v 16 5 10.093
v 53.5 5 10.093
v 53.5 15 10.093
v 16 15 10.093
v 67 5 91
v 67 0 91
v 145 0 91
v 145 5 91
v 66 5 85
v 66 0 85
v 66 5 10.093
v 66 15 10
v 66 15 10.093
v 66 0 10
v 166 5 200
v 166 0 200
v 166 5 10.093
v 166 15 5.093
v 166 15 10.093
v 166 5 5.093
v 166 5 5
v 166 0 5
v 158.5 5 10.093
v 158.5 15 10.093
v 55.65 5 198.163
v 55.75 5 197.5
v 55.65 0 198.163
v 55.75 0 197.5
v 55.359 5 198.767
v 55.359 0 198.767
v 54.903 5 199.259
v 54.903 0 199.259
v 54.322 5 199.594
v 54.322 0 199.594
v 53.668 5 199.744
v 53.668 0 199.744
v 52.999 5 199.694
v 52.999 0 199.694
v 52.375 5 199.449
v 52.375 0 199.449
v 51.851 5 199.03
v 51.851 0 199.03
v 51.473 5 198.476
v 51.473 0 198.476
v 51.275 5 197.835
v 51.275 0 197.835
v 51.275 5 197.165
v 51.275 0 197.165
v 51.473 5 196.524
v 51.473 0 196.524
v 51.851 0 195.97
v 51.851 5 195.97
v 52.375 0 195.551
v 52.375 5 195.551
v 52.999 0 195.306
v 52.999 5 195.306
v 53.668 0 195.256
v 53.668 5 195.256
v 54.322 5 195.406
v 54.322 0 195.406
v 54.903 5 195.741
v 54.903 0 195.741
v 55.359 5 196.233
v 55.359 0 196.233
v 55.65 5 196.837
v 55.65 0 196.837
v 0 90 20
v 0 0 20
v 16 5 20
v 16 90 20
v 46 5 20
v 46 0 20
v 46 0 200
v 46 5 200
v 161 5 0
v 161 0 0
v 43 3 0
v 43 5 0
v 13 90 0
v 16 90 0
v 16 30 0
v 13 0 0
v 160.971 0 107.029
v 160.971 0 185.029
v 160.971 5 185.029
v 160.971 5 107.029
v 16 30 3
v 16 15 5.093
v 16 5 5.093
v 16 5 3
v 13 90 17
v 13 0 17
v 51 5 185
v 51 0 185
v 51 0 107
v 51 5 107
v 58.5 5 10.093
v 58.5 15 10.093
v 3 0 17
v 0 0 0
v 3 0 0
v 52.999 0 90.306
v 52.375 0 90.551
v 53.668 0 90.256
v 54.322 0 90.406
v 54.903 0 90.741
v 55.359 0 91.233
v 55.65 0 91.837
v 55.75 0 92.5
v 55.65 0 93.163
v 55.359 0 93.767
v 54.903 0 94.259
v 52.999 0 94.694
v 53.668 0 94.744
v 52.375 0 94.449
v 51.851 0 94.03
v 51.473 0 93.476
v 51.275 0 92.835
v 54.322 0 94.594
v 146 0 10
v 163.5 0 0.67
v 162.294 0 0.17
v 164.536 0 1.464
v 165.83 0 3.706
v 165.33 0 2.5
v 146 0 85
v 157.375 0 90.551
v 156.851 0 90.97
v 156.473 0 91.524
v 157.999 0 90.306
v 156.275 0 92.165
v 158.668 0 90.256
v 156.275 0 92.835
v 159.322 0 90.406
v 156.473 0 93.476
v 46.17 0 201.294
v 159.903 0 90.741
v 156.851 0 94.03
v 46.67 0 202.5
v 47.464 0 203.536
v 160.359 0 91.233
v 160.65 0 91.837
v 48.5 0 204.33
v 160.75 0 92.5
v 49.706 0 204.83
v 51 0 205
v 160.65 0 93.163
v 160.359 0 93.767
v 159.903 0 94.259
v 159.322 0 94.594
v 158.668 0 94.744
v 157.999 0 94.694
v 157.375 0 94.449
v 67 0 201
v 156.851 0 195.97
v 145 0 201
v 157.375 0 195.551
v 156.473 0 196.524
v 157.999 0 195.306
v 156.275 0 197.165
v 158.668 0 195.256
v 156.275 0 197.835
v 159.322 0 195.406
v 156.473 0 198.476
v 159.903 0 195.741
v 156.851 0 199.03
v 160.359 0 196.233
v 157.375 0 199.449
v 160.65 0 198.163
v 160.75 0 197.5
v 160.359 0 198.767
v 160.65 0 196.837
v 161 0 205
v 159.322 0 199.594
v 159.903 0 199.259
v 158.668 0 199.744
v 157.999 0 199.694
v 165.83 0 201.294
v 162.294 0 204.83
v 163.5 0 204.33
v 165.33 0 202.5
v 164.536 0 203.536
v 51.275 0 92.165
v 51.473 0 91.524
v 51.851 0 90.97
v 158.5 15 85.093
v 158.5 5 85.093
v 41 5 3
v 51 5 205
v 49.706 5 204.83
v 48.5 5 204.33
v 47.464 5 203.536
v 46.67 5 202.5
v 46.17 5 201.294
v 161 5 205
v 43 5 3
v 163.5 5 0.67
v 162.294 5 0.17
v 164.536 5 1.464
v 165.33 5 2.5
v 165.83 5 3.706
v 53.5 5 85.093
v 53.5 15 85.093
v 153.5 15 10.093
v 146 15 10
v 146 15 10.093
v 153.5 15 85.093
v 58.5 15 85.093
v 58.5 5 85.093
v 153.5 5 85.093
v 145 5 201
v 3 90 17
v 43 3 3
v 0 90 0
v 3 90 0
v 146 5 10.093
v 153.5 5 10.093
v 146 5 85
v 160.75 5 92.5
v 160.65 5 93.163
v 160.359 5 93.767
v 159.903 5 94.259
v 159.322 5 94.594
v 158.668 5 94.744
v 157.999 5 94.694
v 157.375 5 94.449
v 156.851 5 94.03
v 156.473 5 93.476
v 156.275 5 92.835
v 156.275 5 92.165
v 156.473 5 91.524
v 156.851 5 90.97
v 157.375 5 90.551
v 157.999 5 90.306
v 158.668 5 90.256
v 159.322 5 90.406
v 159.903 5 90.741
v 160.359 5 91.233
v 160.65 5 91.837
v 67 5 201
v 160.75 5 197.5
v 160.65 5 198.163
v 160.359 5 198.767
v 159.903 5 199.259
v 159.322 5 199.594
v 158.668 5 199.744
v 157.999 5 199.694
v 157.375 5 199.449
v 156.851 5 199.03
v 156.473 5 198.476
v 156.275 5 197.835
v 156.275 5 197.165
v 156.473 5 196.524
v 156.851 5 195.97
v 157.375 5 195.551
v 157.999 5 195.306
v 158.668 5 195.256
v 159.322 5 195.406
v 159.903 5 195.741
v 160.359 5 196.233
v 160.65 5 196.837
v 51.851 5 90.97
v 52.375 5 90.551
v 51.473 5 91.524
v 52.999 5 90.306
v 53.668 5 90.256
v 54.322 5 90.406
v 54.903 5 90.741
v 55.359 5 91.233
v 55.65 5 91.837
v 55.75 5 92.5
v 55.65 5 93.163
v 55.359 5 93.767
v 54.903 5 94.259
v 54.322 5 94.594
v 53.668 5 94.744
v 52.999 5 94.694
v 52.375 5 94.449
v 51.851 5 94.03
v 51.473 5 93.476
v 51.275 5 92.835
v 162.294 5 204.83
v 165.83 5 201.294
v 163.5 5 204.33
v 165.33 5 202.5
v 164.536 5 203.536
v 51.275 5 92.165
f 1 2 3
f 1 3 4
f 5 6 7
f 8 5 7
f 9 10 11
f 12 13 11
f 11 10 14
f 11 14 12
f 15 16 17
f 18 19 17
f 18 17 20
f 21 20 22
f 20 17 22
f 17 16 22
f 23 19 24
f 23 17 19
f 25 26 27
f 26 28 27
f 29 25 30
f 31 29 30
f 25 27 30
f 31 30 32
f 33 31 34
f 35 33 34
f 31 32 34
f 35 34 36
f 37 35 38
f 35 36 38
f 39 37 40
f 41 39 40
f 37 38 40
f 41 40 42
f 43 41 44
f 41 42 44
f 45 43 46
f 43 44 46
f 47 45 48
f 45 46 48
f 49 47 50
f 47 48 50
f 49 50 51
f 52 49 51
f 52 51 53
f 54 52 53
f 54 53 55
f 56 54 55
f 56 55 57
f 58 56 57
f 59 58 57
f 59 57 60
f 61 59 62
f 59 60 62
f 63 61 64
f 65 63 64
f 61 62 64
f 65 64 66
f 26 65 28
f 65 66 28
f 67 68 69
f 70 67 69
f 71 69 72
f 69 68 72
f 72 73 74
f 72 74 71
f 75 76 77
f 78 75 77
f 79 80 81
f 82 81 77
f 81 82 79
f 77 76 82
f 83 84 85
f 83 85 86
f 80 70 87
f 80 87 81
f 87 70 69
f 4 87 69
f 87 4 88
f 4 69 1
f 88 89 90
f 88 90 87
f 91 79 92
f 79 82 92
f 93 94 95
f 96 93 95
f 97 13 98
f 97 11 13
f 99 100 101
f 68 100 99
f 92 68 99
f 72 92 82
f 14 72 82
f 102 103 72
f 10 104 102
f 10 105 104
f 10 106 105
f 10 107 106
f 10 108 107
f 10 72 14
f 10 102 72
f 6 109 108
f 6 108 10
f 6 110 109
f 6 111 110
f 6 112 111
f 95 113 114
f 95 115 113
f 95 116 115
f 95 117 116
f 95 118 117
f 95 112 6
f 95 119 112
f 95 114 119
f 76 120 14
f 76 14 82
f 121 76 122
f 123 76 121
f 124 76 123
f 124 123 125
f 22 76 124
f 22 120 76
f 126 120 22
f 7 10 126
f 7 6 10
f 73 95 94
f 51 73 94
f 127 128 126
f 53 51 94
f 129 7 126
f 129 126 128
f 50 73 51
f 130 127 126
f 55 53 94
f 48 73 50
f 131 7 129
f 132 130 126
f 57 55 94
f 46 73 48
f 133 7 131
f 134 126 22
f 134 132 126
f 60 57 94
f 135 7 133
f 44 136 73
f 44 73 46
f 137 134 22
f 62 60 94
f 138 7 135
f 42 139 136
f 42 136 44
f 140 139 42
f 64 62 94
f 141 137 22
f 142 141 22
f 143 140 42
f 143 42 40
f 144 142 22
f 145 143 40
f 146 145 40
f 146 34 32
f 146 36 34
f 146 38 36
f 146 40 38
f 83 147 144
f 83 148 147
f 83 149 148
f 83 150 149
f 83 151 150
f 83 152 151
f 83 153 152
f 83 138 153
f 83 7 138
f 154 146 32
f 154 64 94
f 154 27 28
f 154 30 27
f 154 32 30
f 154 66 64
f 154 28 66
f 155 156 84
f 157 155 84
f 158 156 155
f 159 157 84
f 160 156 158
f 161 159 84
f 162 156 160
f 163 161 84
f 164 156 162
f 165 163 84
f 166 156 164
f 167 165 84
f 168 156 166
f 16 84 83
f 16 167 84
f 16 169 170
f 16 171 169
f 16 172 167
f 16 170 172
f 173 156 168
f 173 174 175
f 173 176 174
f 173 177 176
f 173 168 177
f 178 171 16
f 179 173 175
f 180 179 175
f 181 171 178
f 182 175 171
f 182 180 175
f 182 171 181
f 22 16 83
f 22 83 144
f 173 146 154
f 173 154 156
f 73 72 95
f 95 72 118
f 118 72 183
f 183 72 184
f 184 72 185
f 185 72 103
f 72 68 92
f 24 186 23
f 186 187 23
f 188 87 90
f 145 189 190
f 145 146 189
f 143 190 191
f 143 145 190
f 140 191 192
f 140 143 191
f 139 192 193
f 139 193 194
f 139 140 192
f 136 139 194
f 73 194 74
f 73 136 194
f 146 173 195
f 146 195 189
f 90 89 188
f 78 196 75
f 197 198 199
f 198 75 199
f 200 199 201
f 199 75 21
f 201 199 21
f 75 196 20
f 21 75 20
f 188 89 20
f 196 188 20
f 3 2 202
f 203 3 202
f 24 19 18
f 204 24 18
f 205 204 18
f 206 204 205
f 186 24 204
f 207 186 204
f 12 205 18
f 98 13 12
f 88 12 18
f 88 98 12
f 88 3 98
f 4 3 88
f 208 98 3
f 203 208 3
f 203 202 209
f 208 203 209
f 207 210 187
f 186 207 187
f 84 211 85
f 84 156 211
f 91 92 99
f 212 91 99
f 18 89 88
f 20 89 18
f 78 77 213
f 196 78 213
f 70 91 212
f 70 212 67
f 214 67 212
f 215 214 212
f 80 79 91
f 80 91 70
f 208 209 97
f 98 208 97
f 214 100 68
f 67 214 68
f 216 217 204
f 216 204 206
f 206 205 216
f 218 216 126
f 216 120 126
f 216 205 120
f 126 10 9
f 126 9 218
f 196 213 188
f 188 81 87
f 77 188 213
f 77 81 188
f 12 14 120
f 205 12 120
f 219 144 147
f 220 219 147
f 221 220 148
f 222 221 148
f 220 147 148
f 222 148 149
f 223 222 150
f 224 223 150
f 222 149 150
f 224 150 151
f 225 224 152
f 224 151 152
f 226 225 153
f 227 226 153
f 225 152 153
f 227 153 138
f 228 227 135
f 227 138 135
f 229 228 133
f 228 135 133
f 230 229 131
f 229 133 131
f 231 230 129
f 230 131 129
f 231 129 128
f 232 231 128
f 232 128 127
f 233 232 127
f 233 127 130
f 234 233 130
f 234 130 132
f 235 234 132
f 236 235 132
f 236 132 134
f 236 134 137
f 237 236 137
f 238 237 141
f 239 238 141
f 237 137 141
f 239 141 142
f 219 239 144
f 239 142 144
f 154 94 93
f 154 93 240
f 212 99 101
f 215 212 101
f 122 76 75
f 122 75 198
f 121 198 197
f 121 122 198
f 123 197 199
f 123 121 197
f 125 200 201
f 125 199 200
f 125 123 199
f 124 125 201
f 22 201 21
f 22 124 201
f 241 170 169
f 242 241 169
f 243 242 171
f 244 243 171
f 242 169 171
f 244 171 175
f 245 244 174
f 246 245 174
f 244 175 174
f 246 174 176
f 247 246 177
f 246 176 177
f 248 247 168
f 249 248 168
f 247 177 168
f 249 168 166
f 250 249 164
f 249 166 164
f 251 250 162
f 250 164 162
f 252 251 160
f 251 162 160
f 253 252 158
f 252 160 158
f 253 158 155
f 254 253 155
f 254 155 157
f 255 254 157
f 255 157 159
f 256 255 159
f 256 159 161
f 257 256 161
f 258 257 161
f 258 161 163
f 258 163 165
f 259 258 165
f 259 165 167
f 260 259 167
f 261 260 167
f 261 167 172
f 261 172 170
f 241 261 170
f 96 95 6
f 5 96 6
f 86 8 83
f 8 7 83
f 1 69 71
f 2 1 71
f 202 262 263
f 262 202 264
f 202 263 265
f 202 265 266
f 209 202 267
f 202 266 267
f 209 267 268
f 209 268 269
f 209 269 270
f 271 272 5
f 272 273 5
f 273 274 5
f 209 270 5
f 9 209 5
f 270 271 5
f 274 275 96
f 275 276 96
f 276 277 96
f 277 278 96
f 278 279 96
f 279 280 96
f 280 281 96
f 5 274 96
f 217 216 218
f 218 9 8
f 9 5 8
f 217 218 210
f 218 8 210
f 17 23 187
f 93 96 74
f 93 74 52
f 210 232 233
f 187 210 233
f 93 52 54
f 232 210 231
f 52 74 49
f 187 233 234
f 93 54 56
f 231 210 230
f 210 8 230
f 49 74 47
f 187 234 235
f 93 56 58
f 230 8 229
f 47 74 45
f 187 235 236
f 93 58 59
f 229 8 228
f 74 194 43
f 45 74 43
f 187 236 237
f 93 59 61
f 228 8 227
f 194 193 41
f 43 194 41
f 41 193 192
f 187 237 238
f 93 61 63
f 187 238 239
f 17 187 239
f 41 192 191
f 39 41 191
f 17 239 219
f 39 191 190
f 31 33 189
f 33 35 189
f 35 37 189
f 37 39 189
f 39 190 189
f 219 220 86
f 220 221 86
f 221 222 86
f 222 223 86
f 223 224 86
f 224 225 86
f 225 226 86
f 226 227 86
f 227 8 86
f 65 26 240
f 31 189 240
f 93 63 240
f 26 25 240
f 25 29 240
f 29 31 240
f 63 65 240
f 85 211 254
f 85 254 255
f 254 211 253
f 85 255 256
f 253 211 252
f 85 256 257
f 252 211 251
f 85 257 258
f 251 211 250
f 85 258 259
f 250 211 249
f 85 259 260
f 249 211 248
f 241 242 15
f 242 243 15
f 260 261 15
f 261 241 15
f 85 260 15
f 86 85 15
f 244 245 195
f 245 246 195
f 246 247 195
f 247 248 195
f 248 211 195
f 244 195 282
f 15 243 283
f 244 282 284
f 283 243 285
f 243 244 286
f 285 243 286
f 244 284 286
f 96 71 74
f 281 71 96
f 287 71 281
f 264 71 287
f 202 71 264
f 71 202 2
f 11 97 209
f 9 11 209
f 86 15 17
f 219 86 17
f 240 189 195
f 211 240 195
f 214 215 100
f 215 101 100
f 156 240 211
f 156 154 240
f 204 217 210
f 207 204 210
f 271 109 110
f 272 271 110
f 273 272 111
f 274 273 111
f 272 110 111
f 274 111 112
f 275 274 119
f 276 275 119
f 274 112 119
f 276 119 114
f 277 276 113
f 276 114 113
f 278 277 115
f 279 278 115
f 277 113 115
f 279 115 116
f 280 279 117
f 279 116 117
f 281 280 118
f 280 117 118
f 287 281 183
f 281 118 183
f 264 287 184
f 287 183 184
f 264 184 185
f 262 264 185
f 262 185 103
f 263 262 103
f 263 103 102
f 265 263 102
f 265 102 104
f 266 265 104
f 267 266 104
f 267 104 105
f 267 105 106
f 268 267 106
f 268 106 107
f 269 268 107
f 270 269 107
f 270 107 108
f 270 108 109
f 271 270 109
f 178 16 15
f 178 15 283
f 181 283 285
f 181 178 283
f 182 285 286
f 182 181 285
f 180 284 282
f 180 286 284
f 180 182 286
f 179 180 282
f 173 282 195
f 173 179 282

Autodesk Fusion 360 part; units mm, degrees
sketch "Sketch1" plane through (0, 0, 0) normal (0, 1, 0) x (1, 0, 0)
  line L0 (0, 0) -> (0, -20)
  line L1 (0, -20) -> (16, -20)
  line L2 (16, -20) -> (16, 0)
  line L3 (16, 0) -> (13, 0)
  line L4 (13, 0) -> (13, -17)
  line L5 (13, -17) -> (3, -17)
  line L6 (3, -17) -> (3, 0)
  line L7 (3, 0) -> (0, 0)
extrude "Extrude1" add sketch "Sketch1" along normal blind 60
sketch "Sketch2" plane through (0, 0, 0) normal (0, -1, 0) x (1, 0, 0)
  line L0 (0, 0) -> (3, 0)
  line L1 (3, 0) -> (3, 17)
  line L2 (3, 17) -> (13, 17)
  line L3 (13, 17) -> (13, 0)
  line L4 (13, 0) -> (16, 0)
  line L5 (16, 0) -> (16, 20)
  line L6 (16, 20) -> (0, 20)
  line L7 (0, 20) -> (0, 0)
  line L8 (16, 0) -> (66, 0)
  line L9 (66, 0) -> (66, 85)
  line L10 (66, 85) -> (146, 85)
  line L11 (146, 85) -> (146, 0)
  line L12 (146, 0) -> (166, 0)
  line L13 (166, 0) -> (166, 205)
  line L14 (166, 205) -> (46, 205)
  line L15 (46, 205) -> (46, 20)
  line L16 (46, 20) -> (16, 20)
  dimension "d3" = 50
  dimension "d4" = 85
  dimension "d5" = 80
  dimension "d6" = 20
  dimension "d7" = 205
  dimension "d8" = 120
  dimension "d9" = 185
extrude "Extrude2" add sketch "Sketch2" against normal blind 3 contours L5 L8 L9 L10 L11 L12 L13 L14 L15 L16
sketch "Sketch3" plane through (0, 0, 0) normal (0, 1, 0) x (1, 0, 0)
  line L0 (65, 0) -> (150, 0)
  line L1 (150, 0) -> (150, -10)
  line L2 (150, -10) -> (65, -10)
  line L3 (65, -10) -> (65, 0)
extrude "Extrude3" add sketch "Sketch3" along normal blind 3
sketch "Sketch4" plane through (0, 0, 0) normal (0, 1, 0) x (1, 0, 0)
sketch "Sketch5" plane through (0, 0, 0) normal (0, 0, 1) x (1, 0, 0)
  line L0 (16, 3) -> (16, 30)
  line L1 (16, 30) -> (43, 3)
  line L2 (43, 3) -> (16, 3)
extrude "Extrude4" add sketch "Sketch5" along normal blind 3
sketch "Sketch6" plane through (0, 0, 0) normal (0, -1, 0) x (1, 0, 0)
  line L0 (66, 10) -> (66, 85)
  line L1 (66, 85) -> (146, 85)
  line L2 (146, 85) -> (146, 10)
  line L3 (146, 10) -> (66, 10)
  line L4 (13, 0) -> (166, 0)
  line L5 (166, 0) -> (166, 205)
  line L6 (166, 205) -> (46, 205)
  line L7 (46, 205) -> (46, 20)
  line L8 (46, 20) -> (16, 20)
  line L9 (16, 20) -> (0, 20)
  line L10 (0, 20) -> (0, 0)
  line L11 (0, 0) -> (3, 0)
  line L12 (3, 0) -> (3, 17)
  line L13 (3, 17) -> (13, 17)
  line L14 (13, 17) -> (13, 0)
  circle A0 centre (51.25, 199.75) radius 2.25
  circle A1 centre (160.75, 199.75) radius 2.25
  circle A2 centre (51.25, 90.25) radius 2.25
  circle A3 centre (160.75, 90.25) radius 2.25
  dimension "d16" = 4.5
  dimension "d17" = 5.25
  dimension "d18" = 5.25
  dimension "d19" = 4.5
  dimension "d20" = 5.25
  dimension "d21" = 5.25
  dimension "d22" = 4.5
  dimension "d23" = 5.25
  dimension "d24" = 114.75
  dimension "d25" = 4.5
  dimension "d26" = 5.25
  dimension "d27" = 114.75
extrude "Extrude5" cut sketch "Sketch6" against normal blind 5 contours A0 | A1 | A2 | A3
sketch "Sketch7" plane through (0, 0, 0) normal (0, -1, 0) x (1, 0, 0)
  circle A0 centre (160.75, 90.25) radius 2.25
  circle A1 centre (160.75, 199.75) radius 2.25
  circle A2 centre (51.25, 90.25) radius 2.25
  circle A3 centre (51.25, 199.75) radius 2.25
  line L0 (66, 10) -> (66, 85)
  line L1 (66, 85) -> (146, 85)
  line L2 (146, 85) -> (146, 10)
  line L3 (146, 10) -> (66, 10)
  line L4 (13, 0) -> (166, 0)
  line L5 (166, 0) -> (166, 205)
  line L6 (166, 205) -> (46, 205)
  line L7 (46, 205) -> (46, 20)
  line L8 (46, 20) -> (16, 20)
  line L9 (16, 20) -> (0, 20)
  line L10 (0, 20) -> (0, 0)
  line L11 (0, 0) -> (3, 0)
  line L12 (3, 0) -> (3, 17)
  line L13 (3, 17) -> (13, 17)
  line L14 (13, 17) -> (13, 0)
  line L15 (51, 185) -> (67, 201)
  line L16 (67, 201) -> (145, 201)
  line L17 (145, 201) -> (160.9711, 185.0289)
  line L18 (160.9711, 185.0289) -> (160.9711, 107.0289)
  line L19 (51, 185) -> (51, 107)
  line L20 (51, 107) -> (66.9997, 91.0003)
  line L21 (66.9997, 91.0003) -> (144.9997, 91.0003)
  line L22 (144.9997, 91.0003) -> (160.9711, 107.0289)
  dimension "d30" = 78
  dimension "d31" = 22.627
  dimension "d32" = 78
  dimension "d33" = 78
extrude "Extrude6" cut sketch "Sketch7" against normal blind 10 contours L15 L16 L17 L18 L19 L20 L21 L22
sketch "Sketch8" plane through (0, 0, 0) normal (0, -1, 0) x (1, 0, 0)
  line L0 (66.9997, 91.0003) -> (51, 107)
  line L1 (51, 107) -> (51, 185)
  line L2 (51, 185) -> (67, 201)
  line L3 (67, 201) -> (145, 201)
  line L4 (145, 201) -> (160.9711, 185.0289)
  line L5 (160.9711, 185.0289) -> (160.9711, 107.0289)
  line L6 (160.9711, 107.0289) -> (144.9997, 91.0003)
  line L7 (144.9997, 91.0003) -> (66.9997, 91.0003)
  circle A0 centre (160.75, 90.25) radius 2.25
  circle A1 centre (160.75, 199.75) radius 2.25
  circle A2 centre (51.25, 90.25) radius 2.25
  line L8 (66, 10) -> (66, 85)
  line L9 (66, 85) -> (146, 85)
  line L10 (146, 85) -> (146, 10)
  line L11 (146, 10) -> (66, 10)
  line L12 (13, 0) -> (166, 0)
  line L13 (166, 0) -> (166, 205)
  line L14 (166, 205) -> (46, 205)
  line L15 (46, 205) -> (46, 20)
  line L16 (46, 20) -> (16, 20)
  line L17 (16, 20) -> (0, 20)
  line L18 (0, 20) -> (0, 0)
  line L19 (0, 0) -> (3, 0)
  line L20 (3, 0) -> (3, 17)
  line L21 (3, 17) -> (13, 17)
  line L22 (13, 17) -> (13, 0)
sketch "Sketch9" plane through (0, 0, 0) normal (0, -1, 0) x (1, 0, 0)
  circle A0 centre (51, 200) radius 3.6056
extrude "Extrude7" add sketch "Sketch9" against normal blind 3
sketch "Sketch10" plane through (0, 0, 0) normal (0, -1, 0) x (1, 0, 0)
  circle A0 centre (53.5, 197.5) radius 2.25
  line L0 (46, 205) -> (46, 20)
  line L1 (166, 205) -> (46, 205)
  dimension "d38" = 4.5
  dimension "d39" = 7.5
  dimension "d40" = 7.5
sketch "Sketch11" plane through (0, 0, 0) normal (0, -1, 0) x (1, 0, 0)
  circle A0 centre (160, 200) radius 4.464
extrude "Extrude8" add sketch "Sketch11" against normal blind 3
sketch "Sketch12" plane through (0, 0, 0) normal (0, -1, 0) x (1, 0, 0)
  circle A0 centre (158.5, 197.5) radius 2.25
  line L0 (166, 0) -> (166, 205)
  line L1 (166, 205) -> (46, 205)
  dimension "d43" = 4.5
  dimension "d44" = 7.5
  dimension "d45" = 7.5
extrude "Extrude9" cut sketch "Sketch10" against normal blind 3
extrude "Extrude10" cut sketch "Sketch12" against normal blind 3
sketch "Sketch13" plane through (0, 0, 0) normal (0, -1, 0) x (1, 0, 0)
  circle A0 centre (50, 90) radius 3.5652
  circle A1 centre (160, 90) radius 4.4009
extrude "Extrude11" add sketch "Sketch13" against normal blind 3 contours A0
extrude "Extrude12" add sketch "Sketch8" against normal blind 3 contours A0
sketch "Sketch14" plane through (0, 0, 0) normal (0, -1, 0) x (1, 0, 0)
  circle A0 centre (158.5, 197.5) radius 2.25
  circle A1 centre (53.5, 197.5) radius 2.25
  line L0 (66.9997, 91.0003) -> (51, 107)
  line L1 (51, 107) -> (51, 185)
  line L2 (51, 185) -> (67, 201)
  line L3 (67, 201) -> (145, 201)
  line L4 (145, 201) -> (160.9711, 185.0289)
  line L5 (160.9711, 185.0289) -> (160.9711, 107.0289)
  line L6 (160.9711, 107.0289) -> (144.9997, 91.0003)
  line L7 (144.9997, 91.0003) -> (66.9997, 91.0003)
  line L8 (66, 10) -> (66, 85)
  line L9 (66, 85) -> (146, 85)
  line L10 (146, 85) -> (146, 10)
  line L11 (146, 10) -> (66, 10)
  line L12 (13, 0) -> (166, 0)
  line L13 (166, 0) -> (166, 205)
  line L14 (166, 205) -> (46, 205)
  line L15 (46, 205) -> (46, 20)
  line L16 (46, 20) -> (16, 20)
  line L17 (16, 20) -> (0, 20)
  line L18 (0, 20) -> (0, 0)
  line L19 (0, 0) -> (3, 0)
  line L20 (3, 0) -> (3, 17)
  line L21 (3, 17) -> (13, 17)
  line L22 (13, 17) -> (13, 0)
  circle A2 centre (53.5, 92.5) radius 2.25
  circle A3 centre (158.5, 92.5) radius 2.25
  dimension "d54" = 4.5
  dimension "d55" = 7.5
  dimension "d57" = 7.5
  dimension "d58" = 4.5
  dimension "d59" = 7.5
  dimension "d60" = 7.5
extrude "Extrude13" cut sketch "Sketch14" against normal blind 3 contours A2 | A3
fillet "Fillet1" radius 5 1 edges at (46, 1.5, 205)
fillet "Fillet2" radius 5 1 edges at (166, 1.5, 205)
fillet "Fillet3" radius 5 1 edges at (166, 1.5, 0)
extrude "Extrude14" add 1 faces at (59.3333, 3, 38.3333) along direction (0, 1, 0) blind 2
sketch "Sketch15" plane through (0, 5, 0) normal (0, 1, 0) x (-1, 0, 0)
  arc A0 (-166, 5) -> (-161, 0) centre (-161, 5) ccw
  line L0 (-161, 0) -> (-43, 0)
  line L1 (-43, 0) -> (-43, 3)
  line L2 (-43, 3) -> (-41, 3)
  line L3 (-41, 3) -> (-16, 3)
  line L4 (-16, 3) -> (-16, 20)
  line L5 (-16, 20) -> (-46, 20)
  line L6 (-46, 20) -> (-46, 200)
  arc A1 (-46, 200) -> (-51, 205) centre (-51, 200) ccw
  line L7 (-51, 205) -> (-161, 205)
  arc A2 (-161, 205) -> (-166, 200) centre (-161, 200) ccw
  line L8 (-166, 200) -> (-166, 5)
  circle A3 centre (-53.5, 92.5) radius 2.25
  circle A4 centre (-158.5, 92.5) radius 2.25
  circle A5 centre (-158.5, 197.5) radius 2.25
  circle A6 centre (-53.5, 197.5) radius 2.25
  line L9 (-51, 107) -> (-66.9997, 91.0003)
  line L10 (-66.9997, 91.0003) -> (-144.9997, 91.0003)
  line L11 (-144.9997, 91.0003) -> (-160.9711, 107.0289)
  line L12 (-160.9711, 107.0289) -> (-160.9711, 185.0289)
  line L13 (-160.9711, 185.0289) -> (-145, 201)
  line L14 (-145, 201) -> (-67, 201)
  line L15 (-67, 201) -> (-51, 185)
  line L16 (-51, 185) -> (-51, 107)
  line L17 (-66, 10) -> (-146, 10)
  line L18 (-146, 10) -> (-146, 85)
  line L19 (-146, 85) -> (-66, 85)
  line L20 (-66, 85) -> (-66, 10)
  line L21 (-166, 10.0934) -> (-16, 10.0934)
  line L22 (-16, 10.0934) -> (-16, 5.0934)
  line L23 (-16, 5.0934) -> (-166, 5.0934)
  line L24 (-166, 5.0934) -> (-166, 10.0934)
  dimension "d71" = 5
extrude "Extrude15" add sketch "Sketch15" along normal blind 10 contours L4 L8 L17 L18 L20 L21 L22 L23 L24
sketch "Sketch16" plane through (0, 5, 0) normal (0, 1, 0) x (-1, 0, 0)
  line L0 (-166, 10.0934) -> (-146, 10.0934)
  line L1 (-146, 10.0934) -> (-146, 85)
  line L2 (-146, 85) -> (-66, 85)
  line L3 (-66, 85) -> (-66, 10.0934)
  line L4 (-66, 10.0934) -> (-16, 10.0934)
  line L5 (-16, 10.0934) -> (-16, 20)
  line L6 (-16, 20) -> (-46, 20)
  line L7 (-46, 20) -> (-46, 200)
  arc A0 (-46, 200) -> (-51, 205) centre (-51, 200) ccw
  line L8 (-51, 205) -> (-161, 205)
  arc A1 (-161, 205) -> (-166, 200) centre (-161, 200) ccw
  line L9 (-166, 200) -> (-166, 10.0934)
  line L10 (-51, 107) -> (-66.9997, 91.0003)
  line L11 (-66.9997, 91.0003) -> (-144.9997, 91.0003)
  line L12 (-144.9997, 91.0003) -> (-160.9711, 107.0289)
  line L13 (-160.9711, 107.0289) -> (-160.9711, 185.0289)
  line L14 (-160.9711, 185.0289) -> (-145, 201)
  line L15 (-145, 201) -> (-67, 201)
  line L16 (-67, 201) -> (-51, 185)
  line L17 (-51, 185) -> (-51, 107)
  circle A2 centre (-53.5, 197.5) radius 2.25
  circle A3 centre (-158.5, 197.5) radius 2.25
  circle A4 centre (-158.5, 92.5) radius 2.25
  circle A5 centre (-53.5, 92.5) radius 2.25
  line L18 (-158.5, 10.0934) -> (-153.5, 10.0934)
  line L19 (-153.5, 10.0934) -> (-153.5, 85.0934)
  line L20 (-153.5, 85.0934) -> (-158.5, 85.0934)
  line L21 (-158.5, 85.0934) -> (-158.5, 10.0934)
  dimension "d74" = 75
  dimension "d75" = 7.5
  dimension "d76" = 5
extrude "Extrude16" add sketch "Sketch16" along normal blind 10 contours L0 L18 L19 L20 L21
sketch "Sketch17" plane through (0, 5, 0) normal (0, 1, 0) x (-1, 0, 0)
  circle A0 centre (-53.5, 92.5) radius 2.25
  circle A1 centre (-158.5, 92.5) radius 2.25
  circle A2 centre (-158.5, 197.5) radius 2.25
  circle A3 centre (-53.5, 197.5) radius 2.25
  line L0 (-51, 107) -> (-66.9997, 91.0003)
  line L1 (-66.9997, 91.0003) -> (-144.9997, 91.0003)
  line L2 (-144.9997, 91.0003) -> (-160.9711, 107.0289)
  line L3 (-160.9711, 107.0289) -> (-160.9711, 185.0289)
  line L4 (-160.9711, 185.0289) -> (-145, 201)
  line L5 (-145, 201) -> (-67, 201)
  line L6 (-67, 201) -> (-51, 185)
  line L7 (-51, 185) -> (-51, 107)
  line L8 (-158.5, 10.0934) -> (-158.5, 85.0934)
  line L9 (-158.5, 85.0934) -> (-153.5, 85.0934)
  line L10 (-153.5, 85.0934) -> (-153.5, 10.0934)
  line L11 (-153.5, 10.0934) -> (-146, 10.0934)
  line L12 (-146, 10.0934) -> (-146, 85)
  line L13 (-146, 85) -> (-66, 85)
  line L14 (-66, 85) -> (-66, 10.0934)
  line L15 (-66, 10.0934) -> (-16, 10.0934)
  line L16 (-16, 10.0934) -> (-16, 20)
  line L17 (-16, 20) -> (-46, 20)
  line L18 (-46, 20) -> (-46, 200)
  arc A4 (-46, 200) -> (-51, 205) centre (-51, 200) ccw
  line L19 (-51, 205) -> (-161, 205)
  arc A5 (-161, 205) -> (-166, 200) centre (-161, 200) ccw
  line L20 (-166, 200) -> (-166, 10.0934)
  line L21 (-166, 10.0934) -> (-158.5, 10.0934)
  line L22 (-58.5, 10.0934) -> (-53.5, 10.0934)
  line L23 (-53.5, 10.0934) -> (-53.5, 85.0934)
  line L24 (-53.5, 85.0934) -> (-58.5, 85.0934)
  line L25 (-58.5, 85.0934) -> (-58.5, 10.0934)
  dimension "d79" = 5
  dimension "d80" = 75
  dimension "d81" = 7.5
extrude "Extrude17" add sketch "Sketch17" along normal blind 10 contours L15 L22 L23 L24 L25
extrude "Extrude18" add 1 faces at (1, 60, 12.3333) along direction (0, 1, 0) blind 30
